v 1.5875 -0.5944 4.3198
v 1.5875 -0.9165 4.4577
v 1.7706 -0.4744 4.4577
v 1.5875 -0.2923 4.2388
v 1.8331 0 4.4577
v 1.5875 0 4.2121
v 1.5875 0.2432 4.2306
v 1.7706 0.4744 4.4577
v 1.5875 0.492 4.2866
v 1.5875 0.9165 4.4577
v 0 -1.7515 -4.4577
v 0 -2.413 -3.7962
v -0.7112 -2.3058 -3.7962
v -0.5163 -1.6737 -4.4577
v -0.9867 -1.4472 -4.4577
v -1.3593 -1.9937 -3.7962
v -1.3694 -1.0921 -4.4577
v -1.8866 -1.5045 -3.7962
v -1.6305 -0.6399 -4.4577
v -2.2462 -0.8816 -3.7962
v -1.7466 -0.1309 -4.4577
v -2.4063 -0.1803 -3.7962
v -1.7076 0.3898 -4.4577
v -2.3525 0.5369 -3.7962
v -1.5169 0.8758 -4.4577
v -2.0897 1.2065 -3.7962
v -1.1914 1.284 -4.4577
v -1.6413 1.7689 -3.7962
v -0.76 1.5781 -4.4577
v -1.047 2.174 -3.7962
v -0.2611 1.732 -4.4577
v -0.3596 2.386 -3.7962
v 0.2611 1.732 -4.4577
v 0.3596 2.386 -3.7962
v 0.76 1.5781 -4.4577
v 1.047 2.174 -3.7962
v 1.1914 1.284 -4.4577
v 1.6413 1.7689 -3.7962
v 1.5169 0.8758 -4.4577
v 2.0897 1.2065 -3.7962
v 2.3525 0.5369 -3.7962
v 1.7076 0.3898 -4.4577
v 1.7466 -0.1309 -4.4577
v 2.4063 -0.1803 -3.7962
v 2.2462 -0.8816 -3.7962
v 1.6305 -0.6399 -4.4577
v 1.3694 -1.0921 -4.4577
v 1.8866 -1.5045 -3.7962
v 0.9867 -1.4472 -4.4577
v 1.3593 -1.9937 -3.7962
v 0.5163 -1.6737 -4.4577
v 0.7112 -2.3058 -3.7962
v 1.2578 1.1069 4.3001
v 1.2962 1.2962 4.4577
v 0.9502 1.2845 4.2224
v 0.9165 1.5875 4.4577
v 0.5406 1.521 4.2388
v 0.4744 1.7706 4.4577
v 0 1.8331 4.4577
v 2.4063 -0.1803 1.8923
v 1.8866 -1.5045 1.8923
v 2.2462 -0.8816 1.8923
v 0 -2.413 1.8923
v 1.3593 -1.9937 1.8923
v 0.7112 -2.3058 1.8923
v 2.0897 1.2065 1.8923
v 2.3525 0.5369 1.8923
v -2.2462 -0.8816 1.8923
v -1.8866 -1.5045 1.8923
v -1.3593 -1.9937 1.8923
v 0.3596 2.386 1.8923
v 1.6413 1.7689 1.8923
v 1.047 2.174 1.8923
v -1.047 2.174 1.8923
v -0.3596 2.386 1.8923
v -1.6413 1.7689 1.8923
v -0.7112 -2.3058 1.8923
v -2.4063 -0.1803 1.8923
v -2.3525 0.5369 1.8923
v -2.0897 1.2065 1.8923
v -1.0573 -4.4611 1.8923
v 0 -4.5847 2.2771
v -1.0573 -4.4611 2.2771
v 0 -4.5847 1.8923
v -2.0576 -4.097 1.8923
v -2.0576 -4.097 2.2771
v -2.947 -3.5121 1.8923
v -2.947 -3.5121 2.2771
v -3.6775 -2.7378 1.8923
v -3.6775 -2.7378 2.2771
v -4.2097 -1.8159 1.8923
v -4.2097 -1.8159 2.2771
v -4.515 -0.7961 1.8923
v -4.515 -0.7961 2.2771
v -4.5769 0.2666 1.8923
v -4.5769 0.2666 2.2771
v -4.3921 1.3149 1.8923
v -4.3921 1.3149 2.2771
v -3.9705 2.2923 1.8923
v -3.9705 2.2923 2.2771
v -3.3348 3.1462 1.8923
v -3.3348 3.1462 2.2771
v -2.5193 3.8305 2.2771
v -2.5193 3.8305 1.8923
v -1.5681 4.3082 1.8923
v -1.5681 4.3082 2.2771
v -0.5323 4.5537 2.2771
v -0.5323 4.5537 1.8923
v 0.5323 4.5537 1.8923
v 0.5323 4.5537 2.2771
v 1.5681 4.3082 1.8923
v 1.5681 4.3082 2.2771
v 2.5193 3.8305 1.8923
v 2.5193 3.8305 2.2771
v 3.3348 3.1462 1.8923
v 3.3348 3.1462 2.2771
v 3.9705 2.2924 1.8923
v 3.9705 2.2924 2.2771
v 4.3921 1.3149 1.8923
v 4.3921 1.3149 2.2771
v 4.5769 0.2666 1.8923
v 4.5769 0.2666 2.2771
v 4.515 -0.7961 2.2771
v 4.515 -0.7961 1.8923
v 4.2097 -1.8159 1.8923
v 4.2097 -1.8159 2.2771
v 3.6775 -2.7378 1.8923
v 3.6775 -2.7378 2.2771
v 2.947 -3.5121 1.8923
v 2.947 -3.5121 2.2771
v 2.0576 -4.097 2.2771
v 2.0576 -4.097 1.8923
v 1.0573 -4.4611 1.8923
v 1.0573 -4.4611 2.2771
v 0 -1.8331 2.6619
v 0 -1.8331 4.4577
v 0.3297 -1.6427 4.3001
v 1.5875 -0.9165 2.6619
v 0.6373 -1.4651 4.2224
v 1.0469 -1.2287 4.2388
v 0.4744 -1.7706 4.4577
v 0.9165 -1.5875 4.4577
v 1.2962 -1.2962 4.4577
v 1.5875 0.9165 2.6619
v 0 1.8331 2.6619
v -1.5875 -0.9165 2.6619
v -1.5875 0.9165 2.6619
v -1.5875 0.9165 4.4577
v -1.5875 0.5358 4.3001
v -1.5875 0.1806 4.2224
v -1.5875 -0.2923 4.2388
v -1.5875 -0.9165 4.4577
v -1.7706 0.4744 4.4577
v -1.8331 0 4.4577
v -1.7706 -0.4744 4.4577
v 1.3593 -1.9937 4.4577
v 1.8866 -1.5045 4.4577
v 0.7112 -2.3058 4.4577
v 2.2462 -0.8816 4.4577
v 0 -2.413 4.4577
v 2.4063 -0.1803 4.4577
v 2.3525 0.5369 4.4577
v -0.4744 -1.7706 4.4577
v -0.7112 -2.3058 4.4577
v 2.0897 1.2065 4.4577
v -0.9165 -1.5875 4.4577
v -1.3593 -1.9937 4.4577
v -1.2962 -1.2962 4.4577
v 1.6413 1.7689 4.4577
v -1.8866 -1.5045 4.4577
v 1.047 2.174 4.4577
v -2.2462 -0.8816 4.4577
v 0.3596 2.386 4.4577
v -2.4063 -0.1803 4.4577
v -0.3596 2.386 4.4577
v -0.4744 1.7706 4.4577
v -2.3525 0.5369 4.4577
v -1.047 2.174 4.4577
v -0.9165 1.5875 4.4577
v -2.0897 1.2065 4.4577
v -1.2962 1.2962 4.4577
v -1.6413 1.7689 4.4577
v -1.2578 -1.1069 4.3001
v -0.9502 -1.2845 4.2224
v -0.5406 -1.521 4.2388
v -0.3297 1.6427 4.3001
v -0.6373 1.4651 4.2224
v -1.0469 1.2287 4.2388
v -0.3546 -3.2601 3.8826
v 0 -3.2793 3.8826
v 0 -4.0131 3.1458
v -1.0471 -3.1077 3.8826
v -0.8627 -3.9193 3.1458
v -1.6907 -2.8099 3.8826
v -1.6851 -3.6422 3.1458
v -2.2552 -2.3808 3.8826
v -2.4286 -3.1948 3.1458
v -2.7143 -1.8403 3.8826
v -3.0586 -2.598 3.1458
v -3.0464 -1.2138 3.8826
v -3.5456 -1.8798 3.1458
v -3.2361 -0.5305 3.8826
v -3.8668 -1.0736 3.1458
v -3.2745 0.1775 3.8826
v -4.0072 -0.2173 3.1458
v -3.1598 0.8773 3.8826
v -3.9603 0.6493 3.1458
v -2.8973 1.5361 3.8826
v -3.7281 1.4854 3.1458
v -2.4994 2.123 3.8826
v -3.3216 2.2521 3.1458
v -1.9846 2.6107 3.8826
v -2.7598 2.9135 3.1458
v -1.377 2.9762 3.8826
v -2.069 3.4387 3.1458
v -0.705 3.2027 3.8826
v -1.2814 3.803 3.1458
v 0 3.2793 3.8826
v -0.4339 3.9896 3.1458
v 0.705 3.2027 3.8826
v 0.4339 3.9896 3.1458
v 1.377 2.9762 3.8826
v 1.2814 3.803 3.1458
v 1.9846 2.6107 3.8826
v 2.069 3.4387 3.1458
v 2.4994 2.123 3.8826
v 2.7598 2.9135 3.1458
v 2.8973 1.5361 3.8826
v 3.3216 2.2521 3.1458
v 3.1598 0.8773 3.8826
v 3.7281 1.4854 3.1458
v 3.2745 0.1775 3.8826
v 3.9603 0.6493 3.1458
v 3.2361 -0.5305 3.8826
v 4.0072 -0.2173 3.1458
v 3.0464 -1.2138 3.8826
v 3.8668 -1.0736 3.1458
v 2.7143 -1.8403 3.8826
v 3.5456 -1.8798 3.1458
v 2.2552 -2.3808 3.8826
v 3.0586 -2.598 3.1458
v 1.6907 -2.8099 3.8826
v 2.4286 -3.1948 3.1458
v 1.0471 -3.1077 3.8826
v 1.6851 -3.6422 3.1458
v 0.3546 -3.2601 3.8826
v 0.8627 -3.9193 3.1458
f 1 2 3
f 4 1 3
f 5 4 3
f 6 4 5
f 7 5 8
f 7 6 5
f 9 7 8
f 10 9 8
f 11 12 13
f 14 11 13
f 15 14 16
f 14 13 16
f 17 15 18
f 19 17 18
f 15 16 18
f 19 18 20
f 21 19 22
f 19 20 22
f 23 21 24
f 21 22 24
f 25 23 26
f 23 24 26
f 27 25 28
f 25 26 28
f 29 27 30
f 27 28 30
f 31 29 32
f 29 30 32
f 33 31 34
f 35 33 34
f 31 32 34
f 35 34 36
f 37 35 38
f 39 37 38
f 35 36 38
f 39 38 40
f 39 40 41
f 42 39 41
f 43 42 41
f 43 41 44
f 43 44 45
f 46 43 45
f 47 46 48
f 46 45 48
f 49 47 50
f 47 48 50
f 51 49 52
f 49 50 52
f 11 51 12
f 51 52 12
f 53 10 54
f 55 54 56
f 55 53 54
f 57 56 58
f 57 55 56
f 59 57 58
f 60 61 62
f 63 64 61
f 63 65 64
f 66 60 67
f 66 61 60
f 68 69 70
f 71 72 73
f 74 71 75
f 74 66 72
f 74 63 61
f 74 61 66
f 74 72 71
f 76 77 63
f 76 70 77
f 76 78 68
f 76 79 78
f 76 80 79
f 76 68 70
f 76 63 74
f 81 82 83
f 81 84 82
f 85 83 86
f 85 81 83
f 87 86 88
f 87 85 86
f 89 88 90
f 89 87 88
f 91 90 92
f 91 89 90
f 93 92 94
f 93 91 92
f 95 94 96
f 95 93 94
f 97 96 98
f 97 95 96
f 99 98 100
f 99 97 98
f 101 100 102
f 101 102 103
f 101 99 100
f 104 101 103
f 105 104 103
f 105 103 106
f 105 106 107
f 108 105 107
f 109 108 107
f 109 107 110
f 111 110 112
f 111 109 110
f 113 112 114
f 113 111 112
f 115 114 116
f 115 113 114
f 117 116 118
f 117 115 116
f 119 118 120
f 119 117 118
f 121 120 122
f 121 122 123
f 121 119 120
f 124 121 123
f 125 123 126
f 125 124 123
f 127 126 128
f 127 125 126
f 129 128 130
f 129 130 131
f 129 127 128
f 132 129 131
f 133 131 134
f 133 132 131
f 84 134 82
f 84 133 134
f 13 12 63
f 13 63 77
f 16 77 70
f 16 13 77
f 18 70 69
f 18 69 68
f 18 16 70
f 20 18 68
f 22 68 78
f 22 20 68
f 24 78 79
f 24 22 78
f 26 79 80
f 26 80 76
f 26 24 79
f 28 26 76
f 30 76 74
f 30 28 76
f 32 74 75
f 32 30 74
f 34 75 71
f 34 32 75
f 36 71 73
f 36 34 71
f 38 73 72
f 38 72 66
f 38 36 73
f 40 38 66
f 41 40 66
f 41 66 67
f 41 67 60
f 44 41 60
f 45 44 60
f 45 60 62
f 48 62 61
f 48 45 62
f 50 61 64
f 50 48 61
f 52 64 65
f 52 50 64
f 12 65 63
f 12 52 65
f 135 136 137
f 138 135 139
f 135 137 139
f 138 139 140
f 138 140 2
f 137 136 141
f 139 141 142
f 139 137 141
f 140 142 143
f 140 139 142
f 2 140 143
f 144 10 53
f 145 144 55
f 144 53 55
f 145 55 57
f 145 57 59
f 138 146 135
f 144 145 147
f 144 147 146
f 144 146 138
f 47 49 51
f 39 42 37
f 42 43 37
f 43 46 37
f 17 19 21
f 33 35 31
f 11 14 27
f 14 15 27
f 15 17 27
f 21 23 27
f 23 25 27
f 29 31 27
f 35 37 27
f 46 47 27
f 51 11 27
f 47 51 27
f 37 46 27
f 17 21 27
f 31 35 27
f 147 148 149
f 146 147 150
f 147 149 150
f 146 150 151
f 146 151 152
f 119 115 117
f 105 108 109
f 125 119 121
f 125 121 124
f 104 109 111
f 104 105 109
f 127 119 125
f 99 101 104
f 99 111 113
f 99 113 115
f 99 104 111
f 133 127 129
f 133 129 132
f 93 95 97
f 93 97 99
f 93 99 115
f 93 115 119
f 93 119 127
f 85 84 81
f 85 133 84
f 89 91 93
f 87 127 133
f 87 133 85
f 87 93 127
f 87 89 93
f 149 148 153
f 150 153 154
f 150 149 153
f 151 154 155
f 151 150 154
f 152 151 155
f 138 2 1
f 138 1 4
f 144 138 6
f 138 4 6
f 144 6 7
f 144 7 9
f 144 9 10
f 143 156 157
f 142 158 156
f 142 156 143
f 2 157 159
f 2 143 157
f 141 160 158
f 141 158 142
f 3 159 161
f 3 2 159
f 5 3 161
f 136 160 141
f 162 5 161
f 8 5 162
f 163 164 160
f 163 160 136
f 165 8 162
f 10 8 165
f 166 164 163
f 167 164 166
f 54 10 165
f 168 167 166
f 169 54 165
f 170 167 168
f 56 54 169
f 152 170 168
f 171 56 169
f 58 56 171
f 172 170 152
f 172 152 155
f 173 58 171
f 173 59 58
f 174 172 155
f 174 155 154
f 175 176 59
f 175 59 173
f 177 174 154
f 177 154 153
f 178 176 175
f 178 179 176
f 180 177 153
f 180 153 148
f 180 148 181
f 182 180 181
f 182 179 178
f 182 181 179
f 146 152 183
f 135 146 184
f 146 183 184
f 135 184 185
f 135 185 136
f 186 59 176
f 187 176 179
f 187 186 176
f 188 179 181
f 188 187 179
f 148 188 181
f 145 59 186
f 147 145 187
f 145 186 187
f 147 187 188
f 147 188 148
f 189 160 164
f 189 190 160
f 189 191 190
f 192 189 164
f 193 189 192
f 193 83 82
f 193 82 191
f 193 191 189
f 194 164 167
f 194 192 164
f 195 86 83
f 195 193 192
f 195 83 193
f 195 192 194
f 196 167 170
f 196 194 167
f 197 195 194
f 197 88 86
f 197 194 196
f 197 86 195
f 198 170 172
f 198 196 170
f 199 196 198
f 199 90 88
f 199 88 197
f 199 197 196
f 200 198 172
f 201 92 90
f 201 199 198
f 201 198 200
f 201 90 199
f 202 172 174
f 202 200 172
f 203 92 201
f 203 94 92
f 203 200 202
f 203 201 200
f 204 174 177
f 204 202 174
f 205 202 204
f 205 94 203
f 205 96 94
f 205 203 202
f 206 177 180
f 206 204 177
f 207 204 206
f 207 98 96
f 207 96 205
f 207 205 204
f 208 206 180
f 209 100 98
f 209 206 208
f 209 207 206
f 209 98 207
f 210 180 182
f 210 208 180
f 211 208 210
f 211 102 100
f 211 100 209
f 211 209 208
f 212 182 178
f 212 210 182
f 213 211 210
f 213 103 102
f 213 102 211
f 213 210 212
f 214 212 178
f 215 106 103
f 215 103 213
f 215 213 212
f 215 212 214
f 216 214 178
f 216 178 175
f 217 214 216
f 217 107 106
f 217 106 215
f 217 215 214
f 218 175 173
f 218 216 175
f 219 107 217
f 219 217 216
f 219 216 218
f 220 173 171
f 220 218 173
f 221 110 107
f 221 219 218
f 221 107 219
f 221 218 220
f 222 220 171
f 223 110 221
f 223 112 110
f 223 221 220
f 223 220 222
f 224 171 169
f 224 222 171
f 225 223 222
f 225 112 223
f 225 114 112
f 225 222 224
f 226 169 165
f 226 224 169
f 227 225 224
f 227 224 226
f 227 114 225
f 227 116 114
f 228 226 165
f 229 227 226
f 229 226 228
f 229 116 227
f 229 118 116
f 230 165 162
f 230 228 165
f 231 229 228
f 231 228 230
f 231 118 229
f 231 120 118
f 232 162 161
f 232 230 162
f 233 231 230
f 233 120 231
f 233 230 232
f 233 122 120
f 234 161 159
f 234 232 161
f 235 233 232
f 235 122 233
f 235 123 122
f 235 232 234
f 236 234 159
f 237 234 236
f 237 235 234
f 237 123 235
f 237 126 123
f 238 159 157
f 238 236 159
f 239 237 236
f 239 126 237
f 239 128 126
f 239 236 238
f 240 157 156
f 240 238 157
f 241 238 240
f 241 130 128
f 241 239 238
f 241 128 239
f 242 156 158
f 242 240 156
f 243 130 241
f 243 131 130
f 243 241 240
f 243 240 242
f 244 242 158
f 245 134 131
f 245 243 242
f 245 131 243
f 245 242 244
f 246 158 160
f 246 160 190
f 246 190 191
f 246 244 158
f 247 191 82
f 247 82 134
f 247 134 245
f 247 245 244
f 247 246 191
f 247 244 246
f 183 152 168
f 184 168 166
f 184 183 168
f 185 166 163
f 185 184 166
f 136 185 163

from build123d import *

# Parameters (mm, degrees)
SKETCH11_W         = 6.35
SKETCH11_H         = 2.413
CHAMFER1_SIZE      = 0.661458333
CUT_EXTRUDE2_DEPTH = 1.79578
SKETCH6_R          = 1.833087105
CUT_EXTRUDE3_DEPTH = 1.79578
CUT_EXTRUDE3_TAPER = 45


with BuildPart() as part:
    # Sketch11 → Revolve1 (revolve)
    with BuildSketch(Plane(origin=(0, 0, 0), x_dir=(0, 0, -1), z_dir=(1, 0, 0))):
        with Locations((1.2827, 1.2065)):
            Rectangle(SKETCH11_W, SKETCH11_H)
    revolve(axis=Axis((0, 0, 1.8923), (0, 0, -1)))

    # Chamfer1
    chamfer1_edges = [part.edges().sort_by_distance(p)[0] for p in [
        (0, -2.413, -4.4577),
    ]]
    chamfer(chamfer1_edges, length=CHAMFER1_SIZE)


with BuildPart() as body_2:
    # Sketch7 → Revolve2 (revolve)
    with BuildSketch(Plane(origin=(0, 0, 0), x_dir=(0, 0, -1), z_dir=(1, 0, 0))):
        with BuildLine():
            Line((-2.27711, 4.5847), (-1.8923, 4.5847))
            Line((-1.8923, 4.5847), (-1.8923, 0))
            Line((-1.8923, 0), (-4.4577, 0))
            Line((-4.4577, 0), (-4.4577, 2.413))
            ThreePointArc((-4.4577, 2.413), (-3.532669674, 3.664791196), (-2.27711, 4.5847))
        make_face()
    revolve(axis=Axis((0, 0, 4.4577), (0, 0, -1)))

    # Sketch5 → Cut-Extrude2 (cut)
    with BuildSketch(Plane.XY.offset(4.4577)):
        Polygon((1.5875, -0.916543552), (1.5875, 0.916543552), (0, 1.833087105), (-1.5875, 0.916543552), (-1.5875, -0.916543552), (0, -1.833087105), align=None)
    extrude(amount=-CUT_EXTRUDE2_DEPTH, mode=Mode.SUBTRACT)

    # Sketch6 → Cut-Extrude3 (cut)
    with BuildSketch(Plane.XY.offset(4.4577)):
        Circle(SKETCH6_R)
    extrude(amount=-CUT_EXTRUDE3_DEPTH, taper=CUT_EXTRUDE3_TAPER, mode=Mode.SUBTRACT)


solid = Compound([part.part, body_2.part])
